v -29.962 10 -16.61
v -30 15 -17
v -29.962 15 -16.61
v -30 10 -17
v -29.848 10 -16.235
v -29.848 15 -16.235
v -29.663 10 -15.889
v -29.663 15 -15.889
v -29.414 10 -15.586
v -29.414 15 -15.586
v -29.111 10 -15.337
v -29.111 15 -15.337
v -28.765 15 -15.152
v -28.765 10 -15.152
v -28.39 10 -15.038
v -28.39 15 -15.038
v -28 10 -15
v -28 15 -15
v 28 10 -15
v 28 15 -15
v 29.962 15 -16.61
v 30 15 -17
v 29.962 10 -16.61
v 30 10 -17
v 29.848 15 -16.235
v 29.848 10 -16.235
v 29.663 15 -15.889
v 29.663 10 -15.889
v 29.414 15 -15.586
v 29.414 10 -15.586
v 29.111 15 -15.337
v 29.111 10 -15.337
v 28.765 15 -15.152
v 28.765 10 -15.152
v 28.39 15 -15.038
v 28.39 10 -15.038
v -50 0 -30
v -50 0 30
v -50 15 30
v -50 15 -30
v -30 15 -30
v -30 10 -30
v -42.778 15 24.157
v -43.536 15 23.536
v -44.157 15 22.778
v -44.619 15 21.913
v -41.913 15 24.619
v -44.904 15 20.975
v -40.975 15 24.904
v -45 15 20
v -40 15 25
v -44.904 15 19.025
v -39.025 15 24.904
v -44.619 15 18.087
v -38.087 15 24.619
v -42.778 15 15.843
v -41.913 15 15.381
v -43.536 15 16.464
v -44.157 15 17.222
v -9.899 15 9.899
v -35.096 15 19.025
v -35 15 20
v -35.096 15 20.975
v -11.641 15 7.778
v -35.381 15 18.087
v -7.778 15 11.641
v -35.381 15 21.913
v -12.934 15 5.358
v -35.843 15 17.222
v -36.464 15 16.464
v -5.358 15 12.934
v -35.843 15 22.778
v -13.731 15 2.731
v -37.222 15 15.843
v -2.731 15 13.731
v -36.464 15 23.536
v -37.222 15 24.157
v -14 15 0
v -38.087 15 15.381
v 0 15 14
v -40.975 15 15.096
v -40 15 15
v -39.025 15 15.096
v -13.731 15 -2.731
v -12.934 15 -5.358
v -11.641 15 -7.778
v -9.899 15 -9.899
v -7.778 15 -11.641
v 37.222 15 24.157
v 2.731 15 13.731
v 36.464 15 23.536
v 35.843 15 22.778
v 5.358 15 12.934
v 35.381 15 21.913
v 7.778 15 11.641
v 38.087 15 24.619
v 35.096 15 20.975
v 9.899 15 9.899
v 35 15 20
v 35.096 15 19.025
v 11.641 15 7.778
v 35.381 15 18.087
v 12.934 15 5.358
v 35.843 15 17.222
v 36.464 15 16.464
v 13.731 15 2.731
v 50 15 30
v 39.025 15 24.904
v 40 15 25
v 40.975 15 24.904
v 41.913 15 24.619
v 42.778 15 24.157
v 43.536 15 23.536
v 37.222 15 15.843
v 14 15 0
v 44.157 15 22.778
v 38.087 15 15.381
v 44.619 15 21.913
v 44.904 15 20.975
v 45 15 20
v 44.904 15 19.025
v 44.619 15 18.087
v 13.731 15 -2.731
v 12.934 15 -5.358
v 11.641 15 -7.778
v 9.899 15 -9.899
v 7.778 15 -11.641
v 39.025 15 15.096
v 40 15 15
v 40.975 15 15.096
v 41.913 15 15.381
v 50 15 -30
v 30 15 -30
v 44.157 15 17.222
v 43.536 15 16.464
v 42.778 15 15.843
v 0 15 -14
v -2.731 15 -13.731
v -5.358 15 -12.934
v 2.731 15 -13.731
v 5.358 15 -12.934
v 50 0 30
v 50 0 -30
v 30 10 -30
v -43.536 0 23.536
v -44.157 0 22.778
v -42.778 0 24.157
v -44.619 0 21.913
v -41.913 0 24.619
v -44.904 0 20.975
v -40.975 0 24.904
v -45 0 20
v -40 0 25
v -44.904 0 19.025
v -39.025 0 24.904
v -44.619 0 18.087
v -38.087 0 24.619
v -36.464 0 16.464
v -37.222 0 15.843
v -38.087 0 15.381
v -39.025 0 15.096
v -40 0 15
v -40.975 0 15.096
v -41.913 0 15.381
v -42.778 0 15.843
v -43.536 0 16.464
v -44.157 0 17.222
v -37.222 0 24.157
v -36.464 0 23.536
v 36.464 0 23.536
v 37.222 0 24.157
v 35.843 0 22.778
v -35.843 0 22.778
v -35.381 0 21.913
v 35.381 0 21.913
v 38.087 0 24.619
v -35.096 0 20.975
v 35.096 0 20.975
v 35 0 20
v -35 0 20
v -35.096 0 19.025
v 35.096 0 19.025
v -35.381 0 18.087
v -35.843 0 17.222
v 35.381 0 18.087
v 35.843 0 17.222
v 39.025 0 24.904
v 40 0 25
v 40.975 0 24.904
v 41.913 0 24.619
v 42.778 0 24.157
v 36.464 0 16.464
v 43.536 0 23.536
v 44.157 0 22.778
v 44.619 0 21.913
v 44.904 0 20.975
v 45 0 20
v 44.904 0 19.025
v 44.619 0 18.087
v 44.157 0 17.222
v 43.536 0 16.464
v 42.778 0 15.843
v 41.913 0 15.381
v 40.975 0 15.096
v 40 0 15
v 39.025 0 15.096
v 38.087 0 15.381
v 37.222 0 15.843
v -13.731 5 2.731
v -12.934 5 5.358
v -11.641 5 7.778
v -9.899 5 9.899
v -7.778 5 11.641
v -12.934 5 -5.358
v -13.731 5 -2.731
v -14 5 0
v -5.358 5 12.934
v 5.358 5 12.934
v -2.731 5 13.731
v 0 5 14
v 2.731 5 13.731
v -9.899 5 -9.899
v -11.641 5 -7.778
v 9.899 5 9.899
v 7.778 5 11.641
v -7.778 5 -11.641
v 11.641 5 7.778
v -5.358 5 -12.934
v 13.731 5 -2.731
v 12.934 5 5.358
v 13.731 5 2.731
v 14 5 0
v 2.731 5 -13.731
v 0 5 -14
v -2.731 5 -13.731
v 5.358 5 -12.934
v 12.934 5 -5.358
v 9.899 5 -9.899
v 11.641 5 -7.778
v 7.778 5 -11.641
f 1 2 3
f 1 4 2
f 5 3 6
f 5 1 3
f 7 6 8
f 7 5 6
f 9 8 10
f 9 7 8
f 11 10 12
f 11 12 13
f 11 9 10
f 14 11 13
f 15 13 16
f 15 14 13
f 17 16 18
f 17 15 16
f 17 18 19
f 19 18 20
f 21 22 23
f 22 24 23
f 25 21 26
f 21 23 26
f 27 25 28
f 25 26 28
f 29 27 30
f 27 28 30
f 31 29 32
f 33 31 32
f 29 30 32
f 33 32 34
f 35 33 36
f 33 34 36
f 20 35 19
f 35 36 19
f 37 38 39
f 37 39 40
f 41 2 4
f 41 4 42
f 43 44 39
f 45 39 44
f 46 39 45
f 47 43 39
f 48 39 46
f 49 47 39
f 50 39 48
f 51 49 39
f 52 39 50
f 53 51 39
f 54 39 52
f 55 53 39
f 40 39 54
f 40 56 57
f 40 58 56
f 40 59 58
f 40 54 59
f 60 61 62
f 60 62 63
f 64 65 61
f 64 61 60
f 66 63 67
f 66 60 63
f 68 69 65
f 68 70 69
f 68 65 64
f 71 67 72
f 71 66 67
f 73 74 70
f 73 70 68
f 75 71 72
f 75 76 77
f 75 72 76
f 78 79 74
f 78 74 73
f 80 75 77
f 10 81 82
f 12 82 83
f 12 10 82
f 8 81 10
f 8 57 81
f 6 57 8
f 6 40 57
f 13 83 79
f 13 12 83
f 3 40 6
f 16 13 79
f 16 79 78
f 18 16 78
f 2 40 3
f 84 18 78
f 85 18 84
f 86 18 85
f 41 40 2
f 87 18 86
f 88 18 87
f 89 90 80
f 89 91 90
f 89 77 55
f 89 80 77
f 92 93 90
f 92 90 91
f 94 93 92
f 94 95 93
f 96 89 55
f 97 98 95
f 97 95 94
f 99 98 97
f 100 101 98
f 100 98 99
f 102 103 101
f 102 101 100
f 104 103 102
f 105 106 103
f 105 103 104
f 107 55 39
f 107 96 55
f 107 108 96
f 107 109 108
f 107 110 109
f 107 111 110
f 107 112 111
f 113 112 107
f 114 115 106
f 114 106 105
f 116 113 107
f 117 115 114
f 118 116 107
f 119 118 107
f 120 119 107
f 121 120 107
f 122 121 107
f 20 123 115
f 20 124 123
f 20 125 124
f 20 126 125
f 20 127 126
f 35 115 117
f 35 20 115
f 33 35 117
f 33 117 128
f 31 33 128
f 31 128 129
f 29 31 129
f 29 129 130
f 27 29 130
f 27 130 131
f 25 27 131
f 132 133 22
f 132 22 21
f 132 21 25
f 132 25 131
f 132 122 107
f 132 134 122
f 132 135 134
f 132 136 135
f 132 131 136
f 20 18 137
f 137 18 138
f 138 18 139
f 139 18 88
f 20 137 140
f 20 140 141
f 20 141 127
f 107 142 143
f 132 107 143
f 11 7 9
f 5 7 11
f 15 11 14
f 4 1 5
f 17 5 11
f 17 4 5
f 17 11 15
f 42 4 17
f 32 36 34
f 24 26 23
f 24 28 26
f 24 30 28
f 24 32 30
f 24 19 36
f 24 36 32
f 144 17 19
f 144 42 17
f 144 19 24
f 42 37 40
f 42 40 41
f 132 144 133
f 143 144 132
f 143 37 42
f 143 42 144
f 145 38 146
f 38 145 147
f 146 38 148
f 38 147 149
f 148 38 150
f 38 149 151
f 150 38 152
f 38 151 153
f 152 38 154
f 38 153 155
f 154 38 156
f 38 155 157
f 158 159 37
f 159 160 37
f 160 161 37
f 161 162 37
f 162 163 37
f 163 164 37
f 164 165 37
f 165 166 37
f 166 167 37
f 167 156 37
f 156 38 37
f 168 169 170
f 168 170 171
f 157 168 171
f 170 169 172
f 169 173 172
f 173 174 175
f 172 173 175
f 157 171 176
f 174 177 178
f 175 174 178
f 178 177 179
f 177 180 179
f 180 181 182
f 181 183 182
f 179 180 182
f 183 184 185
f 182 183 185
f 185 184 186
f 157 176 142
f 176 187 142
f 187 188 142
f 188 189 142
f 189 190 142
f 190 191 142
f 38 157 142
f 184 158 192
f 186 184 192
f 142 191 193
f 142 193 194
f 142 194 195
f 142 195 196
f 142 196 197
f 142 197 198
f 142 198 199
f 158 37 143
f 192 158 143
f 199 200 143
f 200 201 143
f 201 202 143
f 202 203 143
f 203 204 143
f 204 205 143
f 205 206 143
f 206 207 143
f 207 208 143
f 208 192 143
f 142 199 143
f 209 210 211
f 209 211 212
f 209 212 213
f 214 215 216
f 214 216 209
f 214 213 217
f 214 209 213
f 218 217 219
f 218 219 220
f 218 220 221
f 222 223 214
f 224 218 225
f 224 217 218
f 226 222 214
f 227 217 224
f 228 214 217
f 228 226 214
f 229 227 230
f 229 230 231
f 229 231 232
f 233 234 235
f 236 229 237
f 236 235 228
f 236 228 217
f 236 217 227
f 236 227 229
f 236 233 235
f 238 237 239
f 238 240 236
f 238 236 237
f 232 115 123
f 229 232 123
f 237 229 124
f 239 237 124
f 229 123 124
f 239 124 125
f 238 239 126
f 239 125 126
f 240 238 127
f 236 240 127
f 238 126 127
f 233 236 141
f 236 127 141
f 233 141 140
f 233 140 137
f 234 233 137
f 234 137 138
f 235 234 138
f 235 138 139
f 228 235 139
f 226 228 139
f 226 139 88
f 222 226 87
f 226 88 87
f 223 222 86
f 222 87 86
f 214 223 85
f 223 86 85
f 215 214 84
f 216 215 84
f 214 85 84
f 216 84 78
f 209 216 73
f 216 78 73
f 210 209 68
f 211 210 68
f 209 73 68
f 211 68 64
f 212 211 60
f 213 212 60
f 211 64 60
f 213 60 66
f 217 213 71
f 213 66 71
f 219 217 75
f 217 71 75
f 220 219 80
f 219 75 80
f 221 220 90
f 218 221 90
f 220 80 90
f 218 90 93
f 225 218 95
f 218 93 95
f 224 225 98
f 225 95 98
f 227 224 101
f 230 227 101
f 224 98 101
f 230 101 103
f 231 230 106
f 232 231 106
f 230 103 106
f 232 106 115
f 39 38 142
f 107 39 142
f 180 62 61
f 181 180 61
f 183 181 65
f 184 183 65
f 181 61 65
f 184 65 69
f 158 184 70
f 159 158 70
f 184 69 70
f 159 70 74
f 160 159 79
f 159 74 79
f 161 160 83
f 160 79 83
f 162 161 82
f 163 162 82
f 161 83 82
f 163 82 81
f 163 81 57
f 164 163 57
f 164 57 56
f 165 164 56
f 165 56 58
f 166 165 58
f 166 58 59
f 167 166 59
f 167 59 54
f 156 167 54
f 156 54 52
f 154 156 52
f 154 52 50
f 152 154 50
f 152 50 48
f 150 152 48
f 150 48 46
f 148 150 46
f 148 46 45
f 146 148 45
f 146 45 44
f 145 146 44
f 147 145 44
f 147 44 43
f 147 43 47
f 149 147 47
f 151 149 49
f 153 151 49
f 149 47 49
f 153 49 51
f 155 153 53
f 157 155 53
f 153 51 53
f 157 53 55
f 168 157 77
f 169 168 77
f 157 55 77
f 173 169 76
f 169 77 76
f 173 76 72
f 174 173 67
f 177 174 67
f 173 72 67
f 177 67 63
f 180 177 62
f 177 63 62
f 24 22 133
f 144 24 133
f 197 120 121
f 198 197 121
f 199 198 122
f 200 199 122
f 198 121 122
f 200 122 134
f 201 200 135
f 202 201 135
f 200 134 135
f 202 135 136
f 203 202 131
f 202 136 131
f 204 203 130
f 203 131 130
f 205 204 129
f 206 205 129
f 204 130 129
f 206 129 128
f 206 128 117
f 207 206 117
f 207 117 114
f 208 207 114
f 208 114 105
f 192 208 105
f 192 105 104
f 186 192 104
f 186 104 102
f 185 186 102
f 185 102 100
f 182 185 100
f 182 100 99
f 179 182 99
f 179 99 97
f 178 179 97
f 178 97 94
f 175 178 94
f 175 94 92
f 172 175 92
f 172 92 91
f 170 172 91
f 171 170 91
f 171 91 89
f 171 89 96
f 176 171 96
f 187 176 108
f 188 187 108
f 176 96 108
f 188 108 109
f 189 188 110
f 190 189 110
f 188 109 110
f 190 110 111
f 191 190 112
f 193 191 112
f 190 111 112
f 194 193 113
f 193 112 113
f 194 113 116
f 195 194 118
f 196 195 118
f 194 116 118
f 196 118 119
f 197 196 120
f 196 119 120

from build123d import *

# Parameters (mm, degrees)
IZIM1_W                     = 100
IZIM1_H                     = 60
Y_KSEKLIK_EKSTR_ZYON1_DEPTH = 15
IZIM2_W                     = 60
IZIM2_H                     = 15
KES_EKSTR_ZYON1_DEPTH       = 5
IZIM3_R                     = 14
KES_EKSTR_ZYON2_DEPTH       = 10
IZIM4_R                     = 5
KES_EKSTR_ZYON3_DEPTH       = 16
RADYUS1_R                   = 2


with BuildPart() as part:
    # Çizim1 → Yükseklik-Ekstrüzyon1 (new body)
    with BuildSketch(Plane(origin=(0, 0, 0), x_dir=(1, 0, 0), z_dir=(0, 1, 0))):
        Rectangle(IZIM1_W, IZIM1_H)
    extrude(amount=Y_KSEKLIK_EKSTR_ZYON1_DEPTH)

    # Çizim2 → Kes-Ekstrüzyon1 (cut)
    with BuildSketch(Plane(origin=(0, 15, 0), x_dir=(1, 0, 0), z_dir=(0, 1, 0))):
        with Locations((0, 22.5)):
            Rectangle(IZIM2_W, IZIM2_H)
    extrude(amount=-KES_EKSTR_ZYON1_DEPTH, mode=Mode.SUBTRACT)

    # Çizim3 → Kes-Ekstrüzyon2 (cut)
    with BuildSketch(Plane(origin=(0, 15, 0), x_dir=(1, 0, 0), z_dir=(0, 1, 0))):
        Circle(IZIM3_R)
    extrude(amount=-KES_EKSTR_ZYON2_DEPTH, mode=Mode.SUBTRACT)

    # Çizim4 → Kes-Ekstrüzyon3 (cut, through all)
    with BuildSketch(Plane(origin=(0, 15, 0), x_dir=(1, 0, 0), z_dir=(0, 1, 0))):
        with Locations((-40, -20)):
            Circle(IZIM4_R)
        with Locations((40, -20)):
            Circle(IZIM4_R)
    extrude(amount=-KES_EKSTR_ZYON3_DEPTH, mode=Mode.SUBTRACT)

    # Radyus1
    radyus1_edges = [part.edges().sort_by_distance(p)[0] for p in [
        (30, 12.5, -15),
        (-30, 12.5, -15),
    ]]
    fillet(radyus1_edges, radius=RADYUS1_R)


solid = part.part
